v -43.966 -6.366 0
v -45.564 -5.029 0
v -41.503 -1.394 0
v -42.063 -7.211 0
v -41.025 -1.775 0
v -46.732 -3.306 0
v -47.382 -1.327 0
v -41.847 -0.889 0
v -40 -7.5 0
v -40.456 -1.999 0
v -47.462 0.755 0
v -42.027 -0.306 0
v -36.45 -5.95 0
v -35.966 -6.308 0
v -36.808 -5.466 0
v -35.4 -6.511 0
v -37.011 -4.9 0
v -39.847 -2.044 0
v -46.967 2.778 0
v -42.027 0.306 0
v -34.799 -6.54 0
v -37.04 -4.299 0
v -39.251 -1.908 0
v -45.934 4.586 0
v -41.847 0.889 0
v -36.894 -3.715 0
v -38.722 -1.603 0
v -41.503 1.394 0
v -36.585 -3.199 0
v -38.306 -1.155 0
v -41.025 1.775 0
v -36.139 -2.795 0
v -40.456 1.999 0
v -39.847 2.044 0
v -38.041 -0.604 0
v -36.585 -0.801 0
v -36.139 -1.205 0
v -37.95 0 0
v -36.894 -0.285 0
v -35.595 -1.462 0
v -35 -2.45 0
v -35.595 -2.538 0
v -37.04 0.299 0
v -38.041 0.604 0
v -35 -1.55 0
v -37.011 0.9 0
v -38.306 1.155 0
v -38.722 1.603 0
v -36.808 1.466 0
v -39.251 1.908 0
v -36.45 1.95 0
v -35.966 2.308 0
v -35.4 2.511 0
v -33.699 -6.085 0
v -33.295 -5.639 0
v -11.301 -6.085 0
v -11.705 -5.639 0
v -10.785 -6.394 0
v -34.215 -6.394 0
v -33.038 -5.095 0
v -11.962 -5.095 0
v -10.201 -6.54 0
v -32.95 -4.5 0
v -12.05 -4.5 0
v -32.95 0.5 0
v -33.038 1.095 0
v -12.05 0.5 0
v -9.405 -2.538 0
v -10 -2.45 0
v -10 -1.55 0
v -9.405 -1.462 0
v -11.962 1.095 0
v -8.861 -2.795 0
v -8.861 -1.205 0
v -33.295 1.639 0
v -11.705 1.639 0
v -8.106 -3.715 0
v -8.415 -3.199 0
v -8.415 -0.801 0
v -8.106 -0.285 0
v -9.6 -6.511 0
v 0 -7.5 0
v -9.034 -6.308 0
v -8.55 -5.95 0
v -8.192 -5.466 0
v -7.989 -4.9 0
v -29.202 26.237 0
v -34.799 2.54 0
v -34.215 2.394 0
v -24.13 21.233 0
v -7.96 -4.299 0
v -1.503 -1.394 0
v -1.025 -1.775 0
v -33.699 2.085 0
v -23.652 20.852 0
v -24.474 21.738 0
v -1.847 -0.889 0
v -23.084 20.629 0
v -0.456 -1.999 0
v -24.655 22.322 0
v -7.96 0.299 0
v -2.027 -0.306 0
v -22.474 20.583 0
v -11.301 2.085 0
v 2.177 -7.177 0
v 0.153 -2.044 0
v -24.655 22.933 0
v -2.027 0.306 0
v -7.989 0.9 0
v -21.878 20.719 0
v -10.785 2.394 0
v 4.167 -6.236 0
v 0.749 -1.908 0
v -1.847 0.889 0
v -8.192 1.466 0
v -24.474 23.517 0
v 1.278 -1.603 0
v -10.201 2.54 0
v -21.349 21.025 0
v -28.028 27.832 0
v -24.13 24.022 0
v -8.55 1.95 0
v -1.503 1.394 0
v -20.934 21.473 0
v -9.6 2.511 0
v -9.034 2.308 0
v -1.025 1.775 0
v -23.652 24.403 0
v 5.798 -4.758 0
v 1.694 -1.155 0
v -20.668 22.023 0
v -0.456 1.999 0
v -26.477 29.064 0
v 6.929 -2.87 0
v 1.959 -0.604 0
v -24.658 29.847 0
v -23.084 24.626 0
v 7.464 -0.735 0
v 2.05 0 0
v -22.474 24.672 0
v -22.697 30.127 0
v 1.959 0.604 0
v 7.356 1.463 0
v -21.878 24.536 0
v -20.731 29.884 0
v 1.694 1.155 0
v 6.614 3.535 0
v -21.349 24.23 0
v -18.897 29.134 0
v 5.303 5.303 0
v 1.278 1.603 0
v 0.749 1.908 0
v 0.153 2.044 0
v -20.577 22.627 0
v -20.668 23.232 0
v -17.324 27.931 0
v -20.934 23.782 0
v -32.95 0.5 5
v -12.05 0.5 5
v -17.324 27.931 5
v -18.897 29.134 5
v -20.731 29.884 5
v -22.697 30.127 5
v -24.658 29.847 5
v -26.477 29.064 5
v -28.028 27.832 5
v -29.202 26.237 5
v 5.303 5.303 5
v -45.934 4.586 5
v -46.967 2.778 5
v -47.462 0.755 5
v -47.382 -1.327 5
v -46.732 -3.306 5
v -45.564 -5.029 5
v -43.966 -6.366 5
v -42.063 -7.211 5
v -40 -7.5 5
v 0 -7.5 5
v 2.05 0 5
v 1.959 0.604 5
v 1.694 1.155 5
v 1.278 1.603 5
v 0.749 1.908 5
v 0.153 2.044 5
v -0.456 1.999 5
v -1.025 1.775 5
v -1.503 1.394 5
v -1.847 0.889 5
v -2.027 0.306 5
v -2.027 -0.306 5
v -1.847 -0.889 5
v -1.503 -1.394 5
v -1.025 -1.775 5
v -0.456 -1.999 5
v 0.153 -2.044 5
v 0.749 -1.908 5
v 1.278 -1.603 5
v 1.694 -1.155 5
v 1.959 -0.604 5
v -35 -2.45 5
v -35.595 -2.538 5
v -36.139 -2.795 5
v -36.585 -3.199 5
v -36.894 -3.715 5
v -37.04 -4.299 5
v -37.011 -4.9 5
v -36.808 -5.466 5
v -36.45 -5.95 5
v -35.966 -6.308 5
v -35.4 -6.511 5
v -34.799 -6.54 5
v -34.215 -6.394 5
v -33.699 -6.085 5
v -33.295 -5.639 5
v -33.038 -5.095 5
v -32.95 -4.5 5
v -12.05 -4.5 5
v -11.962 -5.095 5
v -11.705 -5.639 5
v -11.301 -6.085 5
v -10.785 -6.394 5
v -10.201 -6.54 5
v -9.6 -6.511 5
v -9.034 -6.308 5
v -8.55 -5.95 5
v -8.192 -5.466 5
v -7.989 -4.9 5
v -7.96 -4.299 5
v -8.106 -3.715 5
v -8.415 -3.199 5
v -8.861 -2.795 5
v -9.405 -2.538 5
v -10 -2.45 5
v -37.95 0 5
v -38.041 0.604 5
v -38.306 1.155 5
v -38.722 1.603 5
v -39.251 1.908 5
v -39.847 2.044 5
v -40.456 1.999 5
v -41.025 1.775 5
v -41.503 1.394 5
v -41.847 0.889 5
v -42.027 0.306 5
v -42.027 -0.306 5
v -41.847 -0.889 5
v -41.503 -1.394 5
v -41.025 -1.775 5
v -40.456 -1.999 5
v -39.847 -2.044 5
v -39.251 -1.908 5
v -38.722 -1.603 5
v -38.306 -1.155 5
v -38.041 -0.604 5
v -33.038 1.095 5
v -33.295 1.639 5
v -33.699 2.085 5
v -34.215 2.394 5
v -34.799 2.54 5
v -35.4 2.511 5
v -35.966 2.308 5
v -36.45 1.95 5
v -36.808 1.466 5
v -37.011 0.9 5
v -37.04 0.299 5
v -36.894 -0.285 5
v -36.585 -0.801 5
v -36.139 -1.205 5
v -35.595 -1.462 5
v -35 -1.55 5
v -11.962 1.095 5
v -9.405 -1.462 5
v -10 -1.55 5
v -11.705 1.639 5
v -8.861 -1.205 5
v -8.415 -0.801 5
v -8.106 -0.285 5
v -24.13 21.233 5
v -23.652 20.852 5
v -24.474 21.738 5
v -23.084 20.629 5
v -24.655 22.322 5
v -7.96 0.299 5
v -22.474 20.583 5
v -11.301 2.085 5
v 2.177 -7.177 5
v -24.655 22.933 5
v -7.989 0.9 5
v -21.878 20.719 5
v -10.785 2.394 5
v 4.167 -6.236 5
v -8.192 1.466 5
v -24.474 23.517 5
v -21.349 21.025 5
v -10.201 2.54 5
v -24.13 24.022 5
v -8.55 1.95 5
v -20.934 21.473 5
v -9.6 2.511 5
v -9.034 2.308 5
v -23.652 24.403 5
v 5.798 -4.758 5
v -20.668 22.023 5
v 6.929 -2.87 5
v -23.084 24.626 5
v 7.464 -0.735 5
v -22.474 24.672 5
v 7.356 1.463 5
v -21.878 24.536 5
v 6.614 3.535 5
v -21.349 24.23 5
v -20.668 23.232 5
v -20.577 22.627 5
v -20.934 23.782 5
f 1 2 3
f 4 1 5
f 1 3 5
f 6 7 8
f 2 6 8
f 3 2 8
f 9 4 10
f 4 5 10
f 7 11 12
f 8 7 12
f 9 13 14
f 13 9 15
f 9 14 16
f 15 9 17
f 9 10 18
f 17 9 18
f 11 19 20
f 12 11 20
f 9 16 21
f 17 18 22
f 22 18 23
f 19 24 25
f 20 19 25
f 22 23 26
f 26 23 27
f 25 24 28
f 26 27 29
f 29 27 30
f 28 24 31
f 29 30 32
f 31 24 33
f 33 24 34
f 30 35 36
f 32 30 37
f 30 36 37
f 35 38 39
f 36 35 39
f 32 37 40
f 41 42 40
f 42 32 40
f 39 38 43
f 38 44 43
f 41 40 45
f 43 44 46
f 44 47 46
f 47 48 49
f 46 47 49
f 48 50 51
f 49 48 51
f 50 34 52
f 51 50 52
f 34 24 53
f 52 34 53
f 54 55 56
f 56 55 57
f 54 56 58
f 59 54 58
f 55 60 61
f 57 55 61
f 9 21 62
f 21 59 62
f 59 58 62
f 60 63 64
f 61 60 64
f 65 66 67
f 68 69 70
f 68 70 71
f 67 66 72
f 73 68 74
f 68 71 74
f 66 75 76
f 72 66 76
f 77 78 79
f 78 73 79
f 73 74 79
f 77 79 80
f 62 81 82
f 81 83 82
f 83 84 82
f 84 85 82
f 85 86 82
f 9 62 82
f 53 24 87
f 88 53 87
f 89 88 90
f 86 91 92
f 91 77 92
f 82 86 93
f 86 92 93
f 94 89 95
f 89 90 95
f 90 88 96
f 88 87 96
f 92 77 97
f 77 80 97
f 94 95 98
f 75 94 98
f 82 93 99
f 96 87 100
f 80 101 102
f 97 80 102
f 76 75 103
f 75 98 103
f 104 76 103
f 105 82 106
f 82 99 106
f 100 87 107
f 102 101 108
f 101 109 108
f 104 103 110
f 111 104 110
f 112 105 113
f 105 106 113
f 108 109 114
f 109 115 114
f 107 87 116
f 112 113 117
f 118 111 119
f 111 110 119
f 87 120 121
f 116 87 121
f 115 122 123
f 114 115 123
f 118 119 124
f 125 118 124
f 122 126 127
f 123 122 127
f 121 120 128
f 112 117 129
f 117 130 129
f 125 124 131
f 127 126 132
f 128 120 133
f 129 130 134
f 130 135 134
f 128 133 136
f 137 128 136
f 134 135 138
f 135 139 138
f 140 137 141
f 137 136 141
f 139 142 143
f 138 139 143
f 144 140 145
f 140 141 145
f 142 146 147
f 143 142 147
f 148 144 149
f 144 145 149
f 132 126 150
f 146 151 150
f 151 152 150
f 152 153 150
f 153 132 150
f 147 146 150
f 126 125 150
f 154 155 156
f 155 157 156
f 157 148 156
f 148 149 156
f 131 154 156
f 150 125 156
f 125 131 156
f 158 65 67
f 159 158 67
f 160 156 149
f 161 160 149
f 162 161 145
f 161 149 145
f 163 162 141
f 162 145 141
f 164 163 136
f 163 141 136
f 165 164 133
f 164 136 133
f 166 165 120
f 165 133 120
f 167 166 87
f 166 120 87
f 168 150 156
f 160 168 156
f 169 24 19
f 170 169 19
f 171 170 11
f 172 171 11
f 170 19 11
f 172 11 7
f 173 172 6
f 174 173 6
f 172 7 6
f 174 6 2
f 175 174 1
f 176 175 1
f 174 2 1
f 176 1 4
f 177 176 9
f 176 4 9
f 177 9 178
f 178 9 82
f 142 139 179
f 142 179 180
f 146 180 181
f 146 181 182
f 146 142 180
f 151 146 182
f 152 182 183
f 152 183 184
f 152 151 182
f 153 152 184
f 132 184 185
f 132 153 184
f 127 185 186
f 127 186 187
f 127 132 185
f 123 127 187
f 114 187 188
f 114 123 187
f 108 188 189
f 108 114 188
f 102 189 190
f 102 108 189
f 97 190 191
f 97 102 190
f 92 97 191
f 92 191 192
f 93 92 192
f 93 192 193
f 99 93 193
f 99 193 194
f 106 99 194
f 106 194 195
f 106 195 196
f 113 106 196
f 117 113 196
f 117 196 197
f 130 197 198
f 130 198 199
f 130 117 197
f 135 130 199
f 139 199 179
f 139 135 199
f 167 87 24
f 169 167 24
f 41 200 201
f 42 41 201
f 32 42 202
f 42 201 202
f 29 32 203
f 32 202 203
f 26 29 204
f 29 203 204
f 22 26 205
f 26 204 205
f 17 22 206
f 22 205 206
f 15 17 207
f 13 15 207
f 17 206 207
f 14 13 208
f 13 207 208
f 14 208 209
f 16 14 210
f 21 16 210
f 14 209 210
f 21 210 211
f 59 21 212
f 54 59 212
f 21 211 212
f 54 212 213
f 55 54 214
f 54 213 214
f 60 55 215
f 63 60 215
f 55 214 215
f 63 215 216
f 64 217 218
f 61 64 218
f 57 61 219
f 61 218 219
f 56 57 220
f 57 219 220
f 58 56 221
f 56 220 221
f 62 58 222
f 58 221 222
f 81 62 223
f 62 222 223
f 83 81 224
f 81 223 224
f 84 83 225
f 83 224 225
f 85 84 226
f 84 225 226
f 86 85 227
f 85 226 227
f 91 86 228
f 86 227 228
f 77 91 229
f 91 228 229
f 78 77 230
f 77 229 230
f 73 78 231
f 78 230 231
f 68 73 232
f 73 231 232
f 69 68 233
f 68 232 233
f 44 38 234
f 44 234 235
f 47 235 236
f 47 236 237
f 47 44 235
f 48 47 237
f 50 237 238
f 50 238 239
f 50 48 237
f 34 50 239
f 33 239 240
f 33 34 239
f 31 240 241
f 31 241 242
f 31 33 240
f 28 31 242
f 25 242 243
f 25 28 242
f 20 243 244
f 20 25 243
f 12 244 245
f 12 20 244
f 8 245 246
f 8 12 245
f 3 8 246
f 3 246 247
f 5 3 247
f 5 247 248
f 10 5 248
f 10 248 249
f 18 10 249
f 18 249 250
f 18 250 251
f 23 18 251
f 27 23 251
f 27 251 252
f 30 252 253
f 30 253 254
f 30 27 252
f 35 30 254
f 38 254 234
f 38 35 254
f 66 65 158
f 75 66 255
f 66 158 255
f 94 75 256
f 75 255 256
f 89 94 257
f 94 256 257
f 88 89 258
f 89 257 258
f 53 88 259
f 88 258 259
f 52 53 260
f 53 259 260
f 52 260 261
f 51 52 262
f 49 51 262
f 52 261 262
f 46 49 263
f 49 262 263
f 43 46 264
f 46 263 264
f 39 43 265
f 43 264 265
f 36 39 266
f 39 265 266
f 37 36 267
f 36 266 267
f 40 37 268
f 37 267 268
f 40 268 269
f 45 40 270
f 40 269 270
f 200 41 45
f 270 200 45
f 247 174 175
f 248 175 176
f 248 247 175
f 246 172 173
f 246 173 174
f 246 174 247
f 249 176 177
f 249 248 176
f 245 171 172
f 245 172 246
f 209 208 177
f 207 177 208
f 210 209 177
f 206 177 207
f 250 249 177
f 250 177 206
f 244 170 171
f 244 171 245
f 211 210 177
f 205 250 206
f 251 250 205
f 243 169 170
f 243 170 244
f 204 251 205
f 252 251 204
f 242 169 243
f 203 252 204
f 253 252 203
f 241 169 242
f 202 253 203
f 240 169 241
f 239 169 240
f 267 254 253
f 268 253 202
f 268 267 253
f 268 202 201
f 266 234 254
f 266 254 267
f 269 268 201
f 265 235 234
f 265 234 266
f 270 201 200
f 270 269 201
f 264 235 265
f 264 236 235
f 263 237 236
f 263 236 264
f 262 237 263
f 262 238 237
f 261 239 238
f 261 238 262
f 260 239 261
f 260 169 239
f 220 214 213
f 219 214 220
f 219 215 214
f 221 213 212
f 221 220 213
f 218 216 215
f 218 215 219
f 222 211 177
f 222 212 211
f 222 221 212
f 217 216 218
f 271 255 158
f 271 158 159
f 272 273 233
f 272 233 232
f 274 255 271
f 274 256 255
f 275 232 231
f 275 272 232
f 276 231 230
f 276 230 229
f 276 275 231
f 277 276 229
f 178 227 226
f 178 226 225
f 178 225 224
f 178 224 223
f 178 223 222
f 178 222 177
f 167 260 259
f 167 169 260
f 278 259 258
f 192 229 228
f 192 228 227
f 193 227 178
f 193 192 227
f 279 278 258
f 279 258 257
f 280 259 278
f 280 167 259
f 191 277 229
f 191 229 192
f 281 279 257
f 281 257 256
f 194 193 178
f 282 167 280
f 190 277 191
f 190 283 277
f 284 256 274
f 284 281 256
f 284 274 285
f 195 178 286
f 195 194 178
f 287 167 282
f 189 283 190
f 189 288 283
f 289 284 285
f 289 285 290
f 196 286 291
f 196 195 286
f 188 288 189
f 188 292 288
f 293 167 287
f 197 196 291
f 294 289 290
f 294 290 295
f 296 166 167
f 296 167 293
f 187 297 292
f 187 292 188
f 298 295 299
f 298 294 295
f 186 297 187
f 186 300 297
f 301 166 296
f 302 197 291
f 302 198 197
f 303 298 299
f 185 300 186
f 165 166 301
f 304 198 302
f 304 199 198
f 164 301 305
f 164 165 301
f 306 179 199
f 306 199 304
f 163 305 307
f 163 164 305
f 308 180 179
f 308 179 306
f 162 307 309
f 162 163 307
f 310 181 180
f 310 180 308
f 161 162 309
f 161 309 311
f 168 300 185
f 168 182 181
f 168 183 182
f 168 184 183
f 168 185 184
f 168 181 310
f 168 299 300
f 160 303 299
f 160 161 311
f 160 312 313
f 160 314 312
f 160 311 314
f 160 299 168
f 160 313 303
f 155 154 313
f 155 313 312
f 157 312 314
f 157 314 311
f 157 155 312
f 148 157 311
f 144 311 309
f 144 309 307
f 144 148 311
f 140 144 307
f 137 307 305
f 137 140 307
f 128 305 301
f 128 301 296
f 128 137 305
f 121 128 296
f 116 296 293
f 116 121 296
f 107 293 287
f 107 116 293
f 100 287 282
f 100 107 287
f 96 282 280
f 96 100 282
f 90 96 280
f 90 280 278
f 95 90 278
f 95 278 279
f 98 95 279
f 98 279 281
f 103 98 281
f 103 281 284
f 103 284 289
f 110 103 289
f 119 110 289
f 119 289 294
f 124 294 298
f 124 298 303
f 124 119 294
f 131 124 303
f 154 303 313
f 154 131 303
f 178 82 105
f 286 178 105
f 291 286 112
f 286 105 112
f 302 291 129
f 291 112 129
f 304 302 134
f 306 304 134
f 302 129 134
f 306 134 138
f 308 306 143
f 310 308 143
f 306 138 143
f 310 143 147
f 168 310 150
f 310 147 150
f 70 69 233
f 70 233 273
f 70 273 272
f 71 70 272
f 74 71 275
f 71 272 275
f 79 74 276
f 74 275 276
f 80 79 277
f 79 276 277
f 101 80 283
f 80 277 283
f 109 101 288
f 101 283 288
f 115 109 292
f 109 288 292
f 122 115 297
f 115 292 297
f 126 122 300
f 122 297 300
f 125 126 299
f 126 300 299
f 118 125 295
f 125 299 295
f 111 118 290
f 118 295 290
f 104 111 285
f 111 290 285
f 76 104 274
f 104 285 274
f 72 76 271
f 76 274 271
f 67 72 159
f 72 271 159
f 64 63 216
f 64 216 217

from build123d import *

# Parameters (mm, degrees)
SCHIZZO1_R                   = 2.05
SCHIZZO1_W                   = 25
SCHIZZO1_H                   = 5
ESTRUSIONE_ESTRUSIONE2_DEPTH = 5
CUT_EXTRUDE1_REACH           = 7
SKETCH1_R                    = 2.05


with BuildPart() as part:
    # Schizzo1 → Estrusione-Estrusione2 (new body)
    with BuildSketch(Plane.XY):
        with BuildLine():
            Line((-22.627416998, -7.5), (0, -7.5))
            ThreePointArc((0, -7.5), (6.929096494, -2.870125743), (5.303300859, 5.303300859))
            Line((5.303300859, 5.303300859), (-17.324116139, 27.930717857))
            ThreePointArc((-17.324116139, 27.930717857), (-23.686333927, 30.052287026), (-29.20181593, 26.236749163))
            Line((-29.20181593, 26.236749163), (-45.934294533, 4.586300077))
            ThreePointArc((-45.934294533, 4.586300077), (-46.732282324, -3.305506726), (-40, -7.5))
            Line((-40, -7.5), (-22.627416998, -7.5))
        make_face()
        Circle(SCHIZZO1_R, mode=Mode.SUBTRACT)
        with Locations((-22.627416998, 22.627416998)):
            Circle(SCHIZZO1_R, mode=Mode.SUBTRACT)
        with Locations((-40, 0)):
            Circle(SCHIZZO1_R, mode=Mode.SUBTRACT)
        with Locations((-22.5, -2)):
            Rectangle(SCHIZZO1_W, SCHIZZO1_H, mode=Mode.SUBTRACT)
    extrude(amount=ESTRUSIONE_ESTRUSIONE2_DEPTH)

    # Sketch1 → Cut-Extrude1 (cut, up to next)
    with BuildSketch(Plane.XY.offset(5), mode=Mode.PRIVATE) as cut_extrude1_sk1:
        with Locations((-35, 0.5)):
            Circle(SKETCH1_R)
    cut_extrude1_tool1 = extrude(cut_extrude1_sk1.sketch, amount=-CUT_EXTRUDE1_REACH, mode=Mode.PRIVATE) & part.part
    add(cut_extrude1_tool1.solids().sort_by_distance((-35, 0.5, 5))[0], mode=Mode.SUBTRACT)
    # Sketch1 → Cut-Extrude1 (cut, up to next)
    with BuildSketch(Plane.XY.offset(5), mode=Mode.PRIVATE) as cut_extrude1_sk2:
        with Locations((-35, -4.5)):
            Circle(SKETCH1_R)
    cut_extrude1_tool2 = extrude(cut_extrude1_sk2.sketch, amount=-CUT_EXTRUDE1_REACH, mode=Mode.PRIVATE) & part.part
    add(cut_extrude1_tool2.solids().sort_by_distance((-35, -4.5, 5))[0], mode=Mode.SUBTRACT)
    # Sketch1 → Cut-Extrude1 (cut, up to next)
    with BuildSketch(Plane.XY.offset(5), mode=Mode.PRIVATE) as cut_extrude1_sk3:
        with Locations((-10, -4.5)):
            Circle(SKETCH1_R)
    cut_extrude1_tool3 = extrude(cut_extrude1_sk3.sketch, amount=-CUT_EXTRUDE1_REACH, mode=Mode.PRIVATE) & part.part
    add(cut_extrude1_tool3.solids().sort_by_distance((-10, -4.5, 5))[0], mode=Mode.SUBTRACT)
    # Sketch1 → Cut-Extrude1 (cut, up to next)
    with BuildSketch(Plane.XY.offset(5), mode=Mode.PRIVATE) as cut_extrude1_sk4:
        with Locations((-10, 0.5)):
            Circle(SKETCH1_R)
    cut_extrude1_tool4 = extrude(cut_extrude1_sk4.sketch, amount=-CUT_EXTRUDE1_REACH, mode=Mode.PRIVATE) & part.part
    add(cut_extrude1_tool4.solids().sort_by_distance((-10, 0.5, 5))[0], mode=Mode.SUBTRACT)


solid = part.part
